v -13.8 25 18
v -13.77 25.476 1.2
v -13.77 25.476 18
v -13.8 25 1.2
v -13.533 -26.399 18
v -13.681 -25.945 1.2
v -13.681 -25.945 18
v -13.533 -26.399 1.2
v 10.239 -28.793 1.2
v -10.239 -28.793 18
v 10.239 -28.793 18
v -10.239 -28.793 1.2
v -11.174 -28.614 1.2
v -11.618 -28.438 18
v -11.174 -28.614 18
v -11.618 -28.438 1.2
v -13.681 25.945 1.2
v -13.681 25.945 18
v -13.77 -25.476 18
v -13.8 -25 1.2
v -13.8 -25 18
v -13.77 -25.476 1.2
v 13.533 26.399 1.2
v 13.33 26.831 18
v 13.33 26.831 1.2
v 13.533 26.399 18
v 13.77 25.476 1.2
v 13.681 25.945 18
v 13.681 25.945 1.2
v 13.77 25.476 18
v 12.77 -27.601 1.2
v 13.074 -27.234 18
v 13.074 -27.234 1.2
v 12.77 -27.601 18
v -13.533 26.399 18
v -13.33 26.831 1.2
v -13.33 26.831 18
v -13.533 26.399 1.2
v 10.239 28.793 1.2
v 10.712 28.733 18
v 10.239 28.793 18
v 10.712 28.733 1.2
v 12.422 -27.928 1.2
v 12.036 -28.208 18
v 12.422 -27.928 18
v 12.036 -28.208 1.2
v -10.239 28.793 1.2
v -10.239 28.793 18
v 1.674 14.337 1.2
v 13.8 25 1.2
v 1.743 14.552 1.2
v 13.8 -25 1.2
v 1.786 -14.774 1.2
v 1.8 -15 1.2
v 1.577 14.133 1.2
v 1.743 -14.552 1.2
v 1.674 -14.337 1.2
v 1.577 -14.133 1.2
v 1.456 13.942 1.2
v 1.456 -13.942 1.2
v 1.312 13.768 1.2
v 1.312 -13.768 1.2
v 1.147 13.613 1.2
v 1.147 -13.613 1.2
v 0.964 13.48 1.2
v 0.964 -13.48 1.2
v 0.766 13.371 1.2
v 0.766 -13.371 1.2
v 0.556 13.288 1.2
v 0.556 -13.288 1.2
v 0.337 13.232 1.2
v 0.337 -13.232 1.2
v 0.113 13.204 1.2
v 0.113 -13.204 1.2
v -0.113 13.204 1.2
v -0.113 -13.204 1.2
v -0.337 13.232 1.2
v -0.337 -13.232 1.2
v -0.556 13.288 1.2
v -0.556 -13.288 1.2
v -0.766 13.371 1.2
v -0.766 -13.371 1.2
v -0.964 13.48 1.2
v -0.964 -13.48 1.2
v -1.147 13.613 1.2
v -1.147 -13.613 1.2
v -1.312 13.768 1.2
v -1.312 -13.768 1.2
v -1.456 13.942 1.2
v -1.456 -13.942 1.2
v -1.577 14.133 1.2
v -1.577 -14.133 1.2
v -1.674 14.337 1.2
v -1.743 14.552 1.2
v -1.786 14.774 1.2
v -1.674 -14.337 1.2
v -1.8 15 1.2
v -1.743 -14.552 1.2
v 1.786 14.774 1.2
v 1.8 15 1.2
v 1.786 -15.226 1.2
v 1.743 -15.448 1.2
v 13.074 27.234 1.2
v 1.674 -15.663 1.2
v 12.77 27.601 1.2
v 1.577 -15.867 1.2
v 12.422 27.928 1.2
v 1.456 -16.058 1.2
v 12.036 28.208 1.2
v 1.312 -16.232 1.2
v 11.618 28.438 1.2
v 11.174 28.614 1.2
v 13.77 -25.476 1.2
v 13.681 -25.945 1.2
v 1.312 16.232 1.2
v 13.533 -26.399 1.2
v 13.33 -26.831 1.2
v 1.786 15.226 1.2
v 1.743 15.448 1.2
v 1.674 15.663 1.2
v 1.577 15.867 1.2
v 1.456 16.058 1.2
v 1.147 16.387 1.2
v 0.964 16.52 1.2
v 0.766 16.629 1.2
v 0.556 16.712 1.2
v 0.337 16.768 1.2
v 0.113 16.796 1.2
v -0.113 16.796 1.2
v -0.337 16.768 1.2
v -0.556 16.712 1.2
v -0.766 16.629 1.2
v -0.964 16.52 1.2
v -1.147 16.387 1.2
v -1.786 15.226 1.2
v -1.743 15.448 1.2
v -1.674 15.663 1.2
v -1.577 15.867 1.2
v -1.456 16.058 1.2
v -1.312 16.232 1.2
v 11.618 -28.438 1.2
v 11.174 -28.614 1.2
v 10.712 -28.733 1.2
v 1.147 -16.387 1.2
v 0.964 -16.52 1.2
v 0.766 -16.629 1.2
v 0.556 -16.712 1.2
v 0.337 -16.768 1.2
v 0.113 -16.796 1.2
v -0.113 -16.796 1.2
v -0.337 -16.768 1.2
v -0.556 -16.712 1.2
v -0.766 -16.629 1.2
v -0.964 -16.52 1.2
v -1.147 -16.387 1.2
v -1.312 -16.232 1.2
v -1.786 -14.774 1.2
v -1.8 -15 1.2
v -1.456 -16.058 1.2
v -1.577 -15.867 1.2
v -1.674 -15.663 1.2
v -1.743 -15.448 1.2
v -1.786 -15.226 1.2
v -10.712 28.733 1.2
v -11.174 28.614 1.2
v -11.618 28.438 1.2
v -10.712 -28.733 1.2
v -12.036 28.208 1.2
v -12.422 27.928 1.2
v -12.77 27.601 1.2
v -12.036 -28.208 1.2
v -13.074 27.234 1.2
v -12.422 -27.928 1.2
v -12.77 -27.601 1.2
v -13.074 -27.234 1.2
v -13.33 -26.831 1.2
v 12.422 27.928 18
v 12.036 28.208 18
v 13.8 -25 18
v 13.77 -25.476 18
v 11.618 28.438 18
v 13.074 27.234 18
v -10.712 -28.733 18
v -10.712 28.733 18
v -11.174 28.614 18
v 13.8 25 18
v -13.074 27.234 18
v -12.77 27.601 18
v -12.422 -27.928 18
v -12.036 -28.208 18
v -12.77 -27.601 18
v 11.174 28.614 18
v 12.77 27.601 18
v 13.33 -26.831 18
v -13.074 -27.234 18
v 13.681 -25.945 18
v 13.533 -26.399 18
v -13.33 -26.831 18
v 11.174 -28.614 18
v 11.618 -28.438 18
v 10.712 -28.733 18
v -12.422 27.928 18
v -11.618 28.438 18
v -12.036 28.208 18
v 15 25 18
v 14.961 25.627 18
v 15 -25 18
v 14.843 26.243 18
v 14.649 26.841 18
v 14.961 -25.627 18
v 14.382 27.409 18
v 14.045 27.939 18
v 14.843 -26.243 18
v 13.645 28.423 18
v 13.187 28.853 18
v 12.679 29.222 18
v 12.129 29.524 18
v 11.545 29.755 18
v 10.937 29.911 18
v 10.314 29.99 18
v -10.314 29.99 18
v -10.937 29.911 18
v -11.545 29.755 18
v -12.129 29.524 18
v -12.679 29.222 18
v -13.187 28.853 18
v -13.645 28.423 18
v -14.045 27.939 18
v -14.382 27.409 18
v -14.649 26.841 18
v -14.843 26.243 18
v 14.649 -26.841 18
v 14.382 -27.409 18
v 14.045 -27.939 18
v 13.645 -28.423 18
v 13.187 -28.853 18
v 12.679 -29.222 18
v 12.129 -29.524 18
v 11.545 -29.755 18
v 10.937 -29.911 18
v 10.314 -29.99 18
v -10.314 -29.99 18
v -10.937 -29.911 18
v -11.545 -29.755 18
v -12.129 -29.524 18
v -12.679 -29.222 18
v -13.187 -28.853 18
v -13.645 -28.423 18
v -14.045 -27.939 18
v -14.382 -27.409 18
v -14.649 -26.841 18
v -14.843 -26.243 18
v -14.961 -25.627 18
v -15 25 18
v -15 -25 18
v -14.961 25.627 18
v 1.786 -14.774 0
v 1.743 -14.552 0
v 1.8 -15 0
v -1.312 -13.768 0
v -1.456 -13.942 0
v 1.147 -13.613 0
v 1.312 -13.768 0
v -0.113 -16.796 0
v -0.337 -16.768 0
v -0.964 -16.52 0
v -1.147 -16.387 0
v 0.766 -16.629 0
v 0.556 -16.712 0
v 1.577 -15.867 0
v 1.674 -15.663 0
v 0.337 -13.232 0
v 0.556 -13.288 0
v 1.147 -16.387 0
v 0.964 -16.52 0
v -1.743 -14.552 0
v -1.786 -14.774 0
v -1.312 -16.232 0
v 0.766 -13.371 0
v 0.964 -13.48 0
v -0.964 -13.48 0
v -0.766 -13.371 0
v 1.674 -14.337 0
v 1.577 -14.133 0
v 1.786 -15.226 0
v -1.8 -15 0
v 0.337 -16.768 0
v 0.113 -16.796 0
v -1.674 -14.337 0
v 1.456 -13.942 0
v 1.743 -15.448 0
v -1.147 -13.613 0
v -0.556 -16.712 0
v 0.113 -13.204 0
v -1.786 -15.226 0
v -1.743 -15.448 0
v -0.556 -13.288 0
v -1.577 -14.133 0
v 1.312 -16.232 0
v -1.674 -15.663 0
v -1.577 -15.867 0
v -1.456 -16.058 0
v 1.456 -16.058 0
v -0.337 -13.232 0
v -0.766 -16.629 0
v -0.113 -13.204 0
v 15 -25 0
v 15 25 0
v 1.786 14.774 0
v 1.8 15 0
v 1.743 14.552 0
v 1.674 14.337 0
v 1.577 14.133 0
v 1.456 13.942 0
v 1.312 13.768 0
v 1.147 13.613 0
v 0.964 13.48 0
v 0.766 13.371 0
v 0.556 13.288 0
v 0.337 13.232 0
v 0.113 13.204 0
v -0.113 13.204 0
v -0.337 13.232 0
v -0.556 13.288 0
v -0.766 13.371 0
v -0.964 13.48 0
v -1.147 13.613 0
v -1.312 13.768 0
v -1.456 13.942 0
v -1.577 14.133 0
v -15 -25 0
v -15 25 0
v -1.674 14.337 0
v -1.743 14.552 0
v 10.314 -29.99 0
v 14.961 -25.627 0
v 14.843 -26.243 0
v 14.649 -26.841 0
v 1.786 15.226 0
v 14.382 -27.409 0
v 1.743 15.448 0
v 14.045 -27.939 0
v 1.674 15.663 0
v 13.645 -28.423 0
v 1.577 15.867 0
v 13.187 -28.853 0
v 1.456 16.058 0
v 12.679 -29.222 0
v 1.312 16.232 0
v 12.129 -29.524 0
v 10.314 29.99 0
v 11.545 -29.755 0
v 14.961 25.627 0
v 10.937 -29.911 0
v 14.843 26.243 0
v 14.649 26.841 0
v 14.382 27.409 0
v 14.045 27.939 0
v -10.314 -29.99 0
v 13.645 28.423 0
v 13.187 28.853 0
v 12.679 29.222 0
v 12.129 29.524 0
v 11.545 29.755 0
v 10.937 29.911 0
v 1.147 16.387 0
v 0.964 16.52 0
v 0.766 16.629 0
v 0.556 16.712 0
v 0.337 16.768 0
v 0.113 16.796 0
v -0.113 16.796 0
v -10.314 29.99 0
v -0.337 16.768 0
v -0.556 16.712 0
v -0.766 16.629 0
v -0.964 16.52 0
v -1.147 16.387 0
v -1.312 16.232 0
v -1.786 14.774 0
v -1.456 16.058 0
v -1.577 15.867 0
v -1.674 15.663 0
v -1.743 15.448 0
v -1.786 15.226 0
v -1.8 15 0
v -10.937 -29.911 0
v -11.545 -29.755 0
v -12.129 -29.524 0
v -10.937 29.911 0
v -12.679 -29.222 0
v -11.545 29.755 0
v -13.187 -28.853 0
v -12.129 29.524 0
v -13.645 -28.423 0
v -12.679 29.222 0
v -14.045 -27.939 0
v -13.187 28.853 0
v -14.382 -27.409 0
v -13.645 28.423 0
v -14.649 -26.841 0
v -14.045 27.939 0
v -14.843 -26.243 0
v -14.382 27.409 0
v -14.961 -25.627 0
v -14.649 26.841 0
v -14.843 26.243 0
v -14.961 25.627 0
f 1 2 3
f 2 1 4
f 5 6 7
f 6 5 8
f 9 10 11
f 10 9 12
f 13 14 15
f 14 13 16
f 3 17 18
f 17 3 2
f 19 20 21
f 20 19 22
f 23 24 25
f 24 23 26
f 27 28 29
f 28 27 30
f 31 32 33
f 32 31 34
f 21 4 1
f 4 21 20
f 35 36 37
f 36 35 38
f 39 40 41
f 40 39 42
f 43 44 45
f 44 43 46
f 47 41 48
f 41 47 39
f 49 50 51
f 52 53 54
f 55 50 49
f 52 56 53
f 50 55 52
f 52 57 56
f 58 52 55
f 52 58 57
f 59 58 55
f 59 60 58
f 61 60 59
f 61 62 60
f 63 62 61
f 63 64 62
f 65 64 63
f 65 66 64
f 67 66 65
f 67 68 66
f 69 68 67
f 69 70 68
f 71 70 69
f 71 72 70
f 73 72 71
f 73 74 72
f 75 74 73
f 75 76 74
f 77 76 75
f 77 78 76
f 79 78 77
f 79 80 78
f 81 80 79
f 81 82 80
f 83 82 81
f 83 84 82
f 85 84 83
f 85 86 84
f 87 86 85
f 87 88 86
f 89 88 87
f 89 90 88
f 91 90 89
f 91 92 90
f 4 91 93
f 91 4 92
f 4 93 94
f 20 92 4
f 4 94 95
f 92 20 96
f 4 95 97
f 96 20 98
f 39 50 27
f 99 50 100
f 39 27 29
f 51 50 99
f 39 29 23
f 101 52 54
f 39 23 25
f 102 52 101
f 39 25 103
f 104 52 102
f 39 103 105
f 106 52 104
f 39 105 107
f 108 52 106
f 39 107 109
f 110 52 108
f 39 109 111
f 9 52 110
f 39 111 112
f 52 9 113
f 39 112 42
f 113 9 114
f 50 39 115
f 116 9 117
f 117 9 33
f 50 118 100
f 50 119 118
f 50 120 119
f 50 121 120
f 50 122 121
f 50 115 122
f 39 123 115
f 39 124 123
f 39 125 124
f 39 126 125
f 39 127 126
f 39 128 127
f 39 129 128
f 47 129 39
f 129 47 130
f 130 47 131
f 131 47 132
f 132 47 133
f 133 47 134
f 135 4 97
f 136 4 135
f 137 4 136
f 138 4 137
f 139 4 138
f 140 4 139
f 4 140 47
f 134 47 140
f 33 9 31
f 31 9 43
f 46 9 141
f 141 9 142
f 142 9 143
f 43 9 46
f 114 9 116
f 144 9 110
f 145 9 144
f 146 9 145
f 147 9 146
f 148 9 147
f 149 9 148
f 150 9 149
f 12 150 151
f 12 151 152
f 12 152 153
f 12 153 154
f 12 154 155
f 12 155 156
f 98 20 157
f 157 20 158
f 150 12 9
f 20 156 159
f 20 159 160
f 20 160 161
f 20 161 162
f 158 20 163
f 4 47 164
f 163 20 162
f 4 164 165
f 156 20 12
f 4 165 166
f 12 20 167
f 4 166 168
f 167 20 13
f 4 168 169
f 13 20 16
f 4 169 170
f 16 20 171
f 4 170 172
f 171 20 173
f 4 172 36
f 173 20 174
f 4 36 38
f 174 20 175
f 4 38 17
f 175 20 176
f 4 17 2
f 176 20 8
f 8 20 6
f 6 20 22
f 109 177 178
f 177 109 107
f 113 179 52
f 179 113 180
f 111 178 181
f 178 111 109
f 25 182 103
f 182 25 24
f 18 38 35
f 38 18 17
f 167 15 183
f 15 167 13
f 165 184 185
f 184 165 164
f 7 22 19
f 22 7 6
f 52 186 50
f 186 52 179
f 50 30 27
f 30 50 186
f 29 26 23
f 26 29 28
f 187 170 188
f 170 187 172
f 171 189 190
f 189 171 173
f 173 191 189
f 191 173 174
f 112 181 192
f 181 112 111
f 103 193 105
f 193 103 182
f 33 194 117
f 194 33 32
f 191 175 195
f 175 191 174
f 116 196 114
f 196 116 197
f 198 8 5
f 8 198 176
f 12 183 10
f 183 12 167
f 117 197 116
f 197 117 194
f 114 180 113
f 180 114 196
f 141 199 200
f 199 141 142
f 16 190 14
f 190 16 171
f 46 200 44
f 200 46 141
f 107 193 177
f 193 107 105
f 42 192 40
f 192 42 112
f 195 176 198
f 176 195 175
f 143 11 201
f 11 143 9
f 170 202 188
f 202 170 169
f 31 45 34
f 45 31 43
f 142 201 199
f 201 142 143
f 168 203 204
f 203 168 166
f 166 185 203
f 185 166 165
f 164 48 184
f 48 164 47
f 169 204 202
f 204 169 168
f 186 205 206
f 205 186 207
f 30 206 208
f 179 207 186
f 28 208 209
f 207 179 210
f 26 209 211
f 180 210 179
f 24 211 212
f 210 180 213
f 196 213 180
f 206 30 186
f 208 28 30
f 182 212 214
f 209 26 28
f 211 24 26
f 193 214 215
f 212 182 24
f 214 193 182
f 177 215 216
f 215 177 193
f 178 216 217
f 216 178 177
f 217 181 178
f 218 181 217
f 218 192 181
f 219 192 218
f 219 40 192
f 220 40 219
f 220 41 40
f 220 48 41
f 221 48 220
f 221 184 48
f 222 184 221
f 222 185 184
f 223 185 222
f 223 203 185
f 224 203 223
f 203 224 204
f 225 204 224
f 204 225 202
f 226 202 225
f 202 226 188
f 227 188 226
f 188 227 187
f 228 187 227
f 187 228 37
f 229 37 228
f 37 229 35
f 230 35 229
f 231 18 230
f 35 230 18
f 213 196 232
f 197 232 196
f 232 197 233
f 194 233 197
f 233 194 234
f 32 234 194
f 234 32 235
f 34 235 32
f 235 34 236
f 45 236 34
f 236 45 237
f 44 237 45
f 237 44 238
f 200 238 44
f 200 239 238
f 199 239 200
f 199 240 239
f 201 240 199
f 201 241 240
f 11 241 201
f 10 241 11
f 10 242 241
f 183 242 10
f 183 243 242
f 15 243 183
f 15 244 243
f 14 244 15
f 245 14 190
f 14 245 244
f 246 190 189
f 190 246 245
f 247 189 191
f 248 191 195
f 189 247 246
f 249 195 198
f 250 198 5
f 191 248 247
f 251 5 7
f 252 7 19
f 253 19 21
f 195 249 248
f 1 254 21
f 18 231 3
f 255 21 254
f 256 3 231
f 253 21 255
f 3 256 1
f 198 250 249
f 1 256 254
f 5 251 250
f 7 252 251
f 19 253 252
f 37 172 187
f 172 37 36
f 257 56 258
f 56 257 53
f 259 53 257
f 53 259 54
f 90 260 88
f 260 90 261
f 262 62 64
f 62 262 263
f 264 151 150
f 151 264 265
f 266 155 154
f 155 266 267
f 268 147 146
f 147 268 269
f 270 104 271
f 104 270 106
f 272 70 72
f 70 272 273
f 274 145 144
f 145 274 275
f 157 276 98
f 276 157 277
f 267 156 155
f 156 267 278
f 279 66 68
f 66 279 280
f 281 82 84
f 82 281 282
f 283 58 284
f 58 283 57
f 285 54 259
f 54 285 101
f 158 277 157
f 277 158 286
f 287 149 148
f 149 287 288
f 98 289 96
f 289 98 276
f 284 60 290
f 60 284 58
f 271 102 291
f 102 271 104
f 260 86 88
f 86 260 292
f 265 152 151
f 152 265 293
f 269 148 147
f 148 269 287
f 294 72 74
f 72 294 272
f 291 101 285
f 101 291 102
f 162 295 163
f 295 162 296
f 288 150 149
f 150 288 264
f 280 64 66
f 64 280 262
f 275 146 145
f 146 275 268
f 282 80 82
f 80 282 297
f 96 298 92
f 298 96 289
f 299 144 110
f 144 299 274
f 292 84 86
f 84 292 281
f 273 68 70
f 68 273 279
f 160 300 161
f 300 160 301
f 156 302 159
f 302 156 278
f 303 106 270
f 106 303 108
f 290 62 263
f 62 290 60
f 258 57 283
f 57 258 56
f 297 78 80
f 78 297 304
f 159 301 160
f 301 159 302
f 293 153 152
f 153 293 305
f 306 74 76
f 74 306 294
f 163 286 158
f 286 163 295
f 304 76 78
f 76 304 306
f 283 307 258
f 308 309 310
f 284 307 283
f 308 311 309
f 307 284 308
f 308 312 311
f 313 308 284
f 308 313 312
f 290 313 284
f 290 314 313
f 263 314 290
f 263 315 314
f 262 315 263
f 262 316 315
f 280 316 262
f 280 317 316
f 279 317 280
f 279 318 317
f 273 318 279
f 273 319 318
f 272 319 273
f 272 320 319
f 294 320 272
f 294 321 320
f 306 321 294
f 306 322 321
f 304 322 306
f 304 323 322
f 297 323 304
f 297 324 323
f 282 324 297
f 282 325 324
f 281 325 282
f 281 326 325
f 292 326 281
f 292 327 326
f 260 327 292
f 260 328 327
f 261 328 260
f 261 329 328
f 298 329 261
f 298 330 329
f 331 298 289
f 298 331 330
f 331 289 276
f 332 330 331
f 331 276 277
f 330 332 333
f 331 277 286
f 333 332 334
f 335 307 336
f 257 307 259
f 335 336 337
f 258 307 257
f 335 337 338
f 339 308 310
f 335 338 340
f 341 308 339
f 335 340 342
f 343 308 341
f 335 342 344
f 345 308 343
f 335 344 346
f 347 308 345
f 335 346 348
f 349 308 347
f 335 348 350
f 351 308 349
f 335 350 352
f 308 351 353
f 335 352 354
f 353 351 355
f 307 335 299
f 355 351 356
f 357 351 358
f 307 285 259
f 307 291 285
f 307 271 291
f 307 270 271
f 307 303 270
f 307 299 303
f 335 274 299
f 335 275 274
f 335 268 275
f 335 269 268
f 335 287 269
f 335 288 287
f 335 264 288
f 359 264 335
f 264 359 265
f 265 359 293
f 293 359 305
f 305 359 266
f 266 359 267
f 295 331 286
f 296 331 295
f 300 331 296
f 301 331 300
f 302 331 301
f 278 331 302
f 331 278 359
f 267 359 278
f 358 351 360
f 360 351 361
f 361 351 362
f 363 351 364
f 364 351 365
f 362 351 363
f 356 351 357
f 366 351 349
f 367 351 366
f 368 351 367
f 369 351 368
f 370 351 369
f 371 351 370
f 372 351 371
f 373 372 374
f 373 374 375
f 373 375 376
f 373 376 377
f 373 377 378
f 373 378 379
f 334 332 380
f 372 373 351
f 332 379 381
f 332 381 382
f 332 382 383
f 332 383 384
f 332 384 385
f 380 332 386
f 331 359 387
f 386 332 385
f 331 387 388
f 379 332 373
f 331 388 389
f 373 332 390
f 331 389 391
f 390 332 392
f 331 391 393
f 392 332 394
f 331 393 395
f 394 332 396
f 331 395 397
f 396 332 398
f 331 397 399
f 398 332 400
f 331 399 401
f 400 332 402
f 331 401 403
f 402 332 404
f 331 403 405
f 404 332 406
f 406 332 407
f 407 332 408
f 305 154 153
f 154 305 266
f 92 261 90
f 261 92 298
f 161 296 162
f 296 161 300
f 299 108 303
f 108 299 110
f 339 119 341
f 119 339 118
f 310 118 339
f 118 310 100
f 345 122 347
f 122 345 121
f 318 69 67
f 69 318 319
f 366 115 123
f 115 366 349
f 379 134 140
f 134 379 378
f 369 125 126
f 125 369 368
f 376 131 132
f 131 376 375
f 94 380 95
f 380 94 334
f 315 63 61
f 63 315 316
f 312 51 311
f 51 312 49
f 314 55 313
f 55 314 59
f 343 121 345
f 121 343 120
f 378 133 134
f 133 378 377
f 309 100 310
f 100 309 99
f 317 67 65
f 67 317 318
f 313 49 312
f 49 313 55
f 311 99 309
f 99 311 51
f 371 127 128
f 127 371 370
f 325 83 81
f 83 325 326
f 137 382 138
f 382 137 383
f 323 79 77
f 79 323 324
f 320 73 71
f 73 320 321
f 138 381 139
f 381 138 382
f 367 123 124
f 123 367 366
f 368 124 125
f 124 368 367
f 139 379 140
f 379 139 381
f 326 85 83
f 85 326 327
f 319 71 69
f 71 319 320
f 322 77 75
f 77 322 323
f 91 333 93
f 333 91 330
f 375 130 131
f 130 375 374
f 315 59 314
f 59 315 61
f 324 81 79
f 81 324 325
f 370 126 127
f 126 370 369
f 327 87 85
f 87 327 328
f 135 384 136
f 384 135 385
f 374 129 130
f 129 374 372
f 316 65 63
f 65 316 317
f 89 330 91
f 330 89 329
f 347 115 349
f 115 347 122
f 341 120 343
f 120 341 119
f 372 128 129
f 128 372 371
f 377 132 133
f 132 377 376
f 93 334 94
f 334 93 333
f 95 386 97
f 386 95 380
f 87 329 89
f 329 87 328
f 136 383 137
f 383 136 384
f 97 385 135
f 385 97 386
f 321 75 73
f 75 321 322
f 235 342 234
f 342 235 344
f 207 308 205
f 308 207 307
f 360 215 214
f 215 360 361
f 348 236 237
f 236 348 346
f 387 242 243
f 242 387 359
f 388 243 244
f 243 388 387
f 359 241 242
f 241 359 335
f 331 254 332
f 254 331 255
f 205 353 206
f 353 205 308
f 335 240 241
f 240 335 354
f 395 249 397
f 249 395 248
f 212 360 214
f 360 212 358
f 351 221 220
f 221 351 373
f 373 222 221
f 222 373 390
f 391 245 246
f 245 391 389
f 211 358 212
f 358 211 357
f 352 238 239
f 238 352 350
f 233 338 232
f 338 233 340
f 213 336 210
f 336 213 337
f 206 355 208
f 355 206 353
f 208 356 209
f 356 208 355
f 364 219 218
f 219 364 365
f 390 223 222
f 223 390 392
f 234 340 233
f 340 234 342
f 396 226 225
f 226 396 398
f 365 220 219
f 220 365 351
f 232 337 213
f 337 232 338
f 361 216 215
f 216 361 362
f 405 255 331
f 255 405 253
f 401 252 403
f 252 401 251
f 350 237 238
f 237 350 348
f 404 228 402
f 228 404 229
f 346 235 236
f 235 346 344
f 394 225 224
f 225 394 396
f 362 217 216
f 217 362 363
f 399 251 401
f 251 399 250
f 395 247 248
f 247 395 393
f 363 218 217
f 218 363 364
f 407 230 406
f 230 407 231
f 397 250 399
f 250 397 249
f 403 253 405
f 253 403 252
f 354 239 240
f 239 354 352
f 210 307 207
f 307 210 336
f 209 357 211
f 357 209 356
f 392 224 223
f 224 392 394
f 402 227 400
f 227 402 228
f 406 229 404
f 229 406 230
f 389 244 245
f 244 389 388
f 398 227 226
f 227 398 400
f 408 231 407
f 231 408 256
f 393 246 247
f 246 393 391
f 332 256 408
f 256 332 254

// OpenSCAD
$fn = 50;


difference() {
	union() {
		hull() {
			translate(v = [-10.0000000000, 25.0000000000, 0]) {
				cylinder(h = 18, r = 5);
			}
			translate(v = [10.0000000000, 25.0000000000, 0]) {
				cylinder(h = 18, r = 5);
			}
			translate(v = [-10.0000000000, -25.0000000000, 0]) {
				cylinder(h = 18, r = 5);
			}
			translate(v = [10.0000000000, -25.0000000000, 0]) {
				cylinder(h = 18, r = 5);
			}
		}
	}
	union() {
		translate(v = [0, 0, 1.2000000000]) {
			hull() {
				translate(v = [-10.0000000000, 25.0000000000, 0]) {
					cylinder(h = 16.8000000000, r = 3.8000000000);
				}
				translate(v = [10.0000000000, 25.0000000000, 0]) {
					cylinder(h = 16.8000000000, r = 3.8000000000);
				}
				translate(v = [-10.0000000000, -25.0000000000, 0]) {
					cylinder(h = 16.8000000000, r = 3.8000000000);
				}
				translate(v = [10.0000000000, -25.0000000000, 0]) {
					cylinder(h = 16.8000000000, r = 3.8000000000);
				}
			}
		}
		#translate(v = [0.0000000000, -15.0000000000, 0]) {
			cylinder(h = 1.2000000000, r = 1.8000000000);
		}
		#translate(v = [0.0000000000, 15.0000000000, 0]) {
			cylinder(h = 1.2000000000, r = 1.8000000000);
		}
	}
}
